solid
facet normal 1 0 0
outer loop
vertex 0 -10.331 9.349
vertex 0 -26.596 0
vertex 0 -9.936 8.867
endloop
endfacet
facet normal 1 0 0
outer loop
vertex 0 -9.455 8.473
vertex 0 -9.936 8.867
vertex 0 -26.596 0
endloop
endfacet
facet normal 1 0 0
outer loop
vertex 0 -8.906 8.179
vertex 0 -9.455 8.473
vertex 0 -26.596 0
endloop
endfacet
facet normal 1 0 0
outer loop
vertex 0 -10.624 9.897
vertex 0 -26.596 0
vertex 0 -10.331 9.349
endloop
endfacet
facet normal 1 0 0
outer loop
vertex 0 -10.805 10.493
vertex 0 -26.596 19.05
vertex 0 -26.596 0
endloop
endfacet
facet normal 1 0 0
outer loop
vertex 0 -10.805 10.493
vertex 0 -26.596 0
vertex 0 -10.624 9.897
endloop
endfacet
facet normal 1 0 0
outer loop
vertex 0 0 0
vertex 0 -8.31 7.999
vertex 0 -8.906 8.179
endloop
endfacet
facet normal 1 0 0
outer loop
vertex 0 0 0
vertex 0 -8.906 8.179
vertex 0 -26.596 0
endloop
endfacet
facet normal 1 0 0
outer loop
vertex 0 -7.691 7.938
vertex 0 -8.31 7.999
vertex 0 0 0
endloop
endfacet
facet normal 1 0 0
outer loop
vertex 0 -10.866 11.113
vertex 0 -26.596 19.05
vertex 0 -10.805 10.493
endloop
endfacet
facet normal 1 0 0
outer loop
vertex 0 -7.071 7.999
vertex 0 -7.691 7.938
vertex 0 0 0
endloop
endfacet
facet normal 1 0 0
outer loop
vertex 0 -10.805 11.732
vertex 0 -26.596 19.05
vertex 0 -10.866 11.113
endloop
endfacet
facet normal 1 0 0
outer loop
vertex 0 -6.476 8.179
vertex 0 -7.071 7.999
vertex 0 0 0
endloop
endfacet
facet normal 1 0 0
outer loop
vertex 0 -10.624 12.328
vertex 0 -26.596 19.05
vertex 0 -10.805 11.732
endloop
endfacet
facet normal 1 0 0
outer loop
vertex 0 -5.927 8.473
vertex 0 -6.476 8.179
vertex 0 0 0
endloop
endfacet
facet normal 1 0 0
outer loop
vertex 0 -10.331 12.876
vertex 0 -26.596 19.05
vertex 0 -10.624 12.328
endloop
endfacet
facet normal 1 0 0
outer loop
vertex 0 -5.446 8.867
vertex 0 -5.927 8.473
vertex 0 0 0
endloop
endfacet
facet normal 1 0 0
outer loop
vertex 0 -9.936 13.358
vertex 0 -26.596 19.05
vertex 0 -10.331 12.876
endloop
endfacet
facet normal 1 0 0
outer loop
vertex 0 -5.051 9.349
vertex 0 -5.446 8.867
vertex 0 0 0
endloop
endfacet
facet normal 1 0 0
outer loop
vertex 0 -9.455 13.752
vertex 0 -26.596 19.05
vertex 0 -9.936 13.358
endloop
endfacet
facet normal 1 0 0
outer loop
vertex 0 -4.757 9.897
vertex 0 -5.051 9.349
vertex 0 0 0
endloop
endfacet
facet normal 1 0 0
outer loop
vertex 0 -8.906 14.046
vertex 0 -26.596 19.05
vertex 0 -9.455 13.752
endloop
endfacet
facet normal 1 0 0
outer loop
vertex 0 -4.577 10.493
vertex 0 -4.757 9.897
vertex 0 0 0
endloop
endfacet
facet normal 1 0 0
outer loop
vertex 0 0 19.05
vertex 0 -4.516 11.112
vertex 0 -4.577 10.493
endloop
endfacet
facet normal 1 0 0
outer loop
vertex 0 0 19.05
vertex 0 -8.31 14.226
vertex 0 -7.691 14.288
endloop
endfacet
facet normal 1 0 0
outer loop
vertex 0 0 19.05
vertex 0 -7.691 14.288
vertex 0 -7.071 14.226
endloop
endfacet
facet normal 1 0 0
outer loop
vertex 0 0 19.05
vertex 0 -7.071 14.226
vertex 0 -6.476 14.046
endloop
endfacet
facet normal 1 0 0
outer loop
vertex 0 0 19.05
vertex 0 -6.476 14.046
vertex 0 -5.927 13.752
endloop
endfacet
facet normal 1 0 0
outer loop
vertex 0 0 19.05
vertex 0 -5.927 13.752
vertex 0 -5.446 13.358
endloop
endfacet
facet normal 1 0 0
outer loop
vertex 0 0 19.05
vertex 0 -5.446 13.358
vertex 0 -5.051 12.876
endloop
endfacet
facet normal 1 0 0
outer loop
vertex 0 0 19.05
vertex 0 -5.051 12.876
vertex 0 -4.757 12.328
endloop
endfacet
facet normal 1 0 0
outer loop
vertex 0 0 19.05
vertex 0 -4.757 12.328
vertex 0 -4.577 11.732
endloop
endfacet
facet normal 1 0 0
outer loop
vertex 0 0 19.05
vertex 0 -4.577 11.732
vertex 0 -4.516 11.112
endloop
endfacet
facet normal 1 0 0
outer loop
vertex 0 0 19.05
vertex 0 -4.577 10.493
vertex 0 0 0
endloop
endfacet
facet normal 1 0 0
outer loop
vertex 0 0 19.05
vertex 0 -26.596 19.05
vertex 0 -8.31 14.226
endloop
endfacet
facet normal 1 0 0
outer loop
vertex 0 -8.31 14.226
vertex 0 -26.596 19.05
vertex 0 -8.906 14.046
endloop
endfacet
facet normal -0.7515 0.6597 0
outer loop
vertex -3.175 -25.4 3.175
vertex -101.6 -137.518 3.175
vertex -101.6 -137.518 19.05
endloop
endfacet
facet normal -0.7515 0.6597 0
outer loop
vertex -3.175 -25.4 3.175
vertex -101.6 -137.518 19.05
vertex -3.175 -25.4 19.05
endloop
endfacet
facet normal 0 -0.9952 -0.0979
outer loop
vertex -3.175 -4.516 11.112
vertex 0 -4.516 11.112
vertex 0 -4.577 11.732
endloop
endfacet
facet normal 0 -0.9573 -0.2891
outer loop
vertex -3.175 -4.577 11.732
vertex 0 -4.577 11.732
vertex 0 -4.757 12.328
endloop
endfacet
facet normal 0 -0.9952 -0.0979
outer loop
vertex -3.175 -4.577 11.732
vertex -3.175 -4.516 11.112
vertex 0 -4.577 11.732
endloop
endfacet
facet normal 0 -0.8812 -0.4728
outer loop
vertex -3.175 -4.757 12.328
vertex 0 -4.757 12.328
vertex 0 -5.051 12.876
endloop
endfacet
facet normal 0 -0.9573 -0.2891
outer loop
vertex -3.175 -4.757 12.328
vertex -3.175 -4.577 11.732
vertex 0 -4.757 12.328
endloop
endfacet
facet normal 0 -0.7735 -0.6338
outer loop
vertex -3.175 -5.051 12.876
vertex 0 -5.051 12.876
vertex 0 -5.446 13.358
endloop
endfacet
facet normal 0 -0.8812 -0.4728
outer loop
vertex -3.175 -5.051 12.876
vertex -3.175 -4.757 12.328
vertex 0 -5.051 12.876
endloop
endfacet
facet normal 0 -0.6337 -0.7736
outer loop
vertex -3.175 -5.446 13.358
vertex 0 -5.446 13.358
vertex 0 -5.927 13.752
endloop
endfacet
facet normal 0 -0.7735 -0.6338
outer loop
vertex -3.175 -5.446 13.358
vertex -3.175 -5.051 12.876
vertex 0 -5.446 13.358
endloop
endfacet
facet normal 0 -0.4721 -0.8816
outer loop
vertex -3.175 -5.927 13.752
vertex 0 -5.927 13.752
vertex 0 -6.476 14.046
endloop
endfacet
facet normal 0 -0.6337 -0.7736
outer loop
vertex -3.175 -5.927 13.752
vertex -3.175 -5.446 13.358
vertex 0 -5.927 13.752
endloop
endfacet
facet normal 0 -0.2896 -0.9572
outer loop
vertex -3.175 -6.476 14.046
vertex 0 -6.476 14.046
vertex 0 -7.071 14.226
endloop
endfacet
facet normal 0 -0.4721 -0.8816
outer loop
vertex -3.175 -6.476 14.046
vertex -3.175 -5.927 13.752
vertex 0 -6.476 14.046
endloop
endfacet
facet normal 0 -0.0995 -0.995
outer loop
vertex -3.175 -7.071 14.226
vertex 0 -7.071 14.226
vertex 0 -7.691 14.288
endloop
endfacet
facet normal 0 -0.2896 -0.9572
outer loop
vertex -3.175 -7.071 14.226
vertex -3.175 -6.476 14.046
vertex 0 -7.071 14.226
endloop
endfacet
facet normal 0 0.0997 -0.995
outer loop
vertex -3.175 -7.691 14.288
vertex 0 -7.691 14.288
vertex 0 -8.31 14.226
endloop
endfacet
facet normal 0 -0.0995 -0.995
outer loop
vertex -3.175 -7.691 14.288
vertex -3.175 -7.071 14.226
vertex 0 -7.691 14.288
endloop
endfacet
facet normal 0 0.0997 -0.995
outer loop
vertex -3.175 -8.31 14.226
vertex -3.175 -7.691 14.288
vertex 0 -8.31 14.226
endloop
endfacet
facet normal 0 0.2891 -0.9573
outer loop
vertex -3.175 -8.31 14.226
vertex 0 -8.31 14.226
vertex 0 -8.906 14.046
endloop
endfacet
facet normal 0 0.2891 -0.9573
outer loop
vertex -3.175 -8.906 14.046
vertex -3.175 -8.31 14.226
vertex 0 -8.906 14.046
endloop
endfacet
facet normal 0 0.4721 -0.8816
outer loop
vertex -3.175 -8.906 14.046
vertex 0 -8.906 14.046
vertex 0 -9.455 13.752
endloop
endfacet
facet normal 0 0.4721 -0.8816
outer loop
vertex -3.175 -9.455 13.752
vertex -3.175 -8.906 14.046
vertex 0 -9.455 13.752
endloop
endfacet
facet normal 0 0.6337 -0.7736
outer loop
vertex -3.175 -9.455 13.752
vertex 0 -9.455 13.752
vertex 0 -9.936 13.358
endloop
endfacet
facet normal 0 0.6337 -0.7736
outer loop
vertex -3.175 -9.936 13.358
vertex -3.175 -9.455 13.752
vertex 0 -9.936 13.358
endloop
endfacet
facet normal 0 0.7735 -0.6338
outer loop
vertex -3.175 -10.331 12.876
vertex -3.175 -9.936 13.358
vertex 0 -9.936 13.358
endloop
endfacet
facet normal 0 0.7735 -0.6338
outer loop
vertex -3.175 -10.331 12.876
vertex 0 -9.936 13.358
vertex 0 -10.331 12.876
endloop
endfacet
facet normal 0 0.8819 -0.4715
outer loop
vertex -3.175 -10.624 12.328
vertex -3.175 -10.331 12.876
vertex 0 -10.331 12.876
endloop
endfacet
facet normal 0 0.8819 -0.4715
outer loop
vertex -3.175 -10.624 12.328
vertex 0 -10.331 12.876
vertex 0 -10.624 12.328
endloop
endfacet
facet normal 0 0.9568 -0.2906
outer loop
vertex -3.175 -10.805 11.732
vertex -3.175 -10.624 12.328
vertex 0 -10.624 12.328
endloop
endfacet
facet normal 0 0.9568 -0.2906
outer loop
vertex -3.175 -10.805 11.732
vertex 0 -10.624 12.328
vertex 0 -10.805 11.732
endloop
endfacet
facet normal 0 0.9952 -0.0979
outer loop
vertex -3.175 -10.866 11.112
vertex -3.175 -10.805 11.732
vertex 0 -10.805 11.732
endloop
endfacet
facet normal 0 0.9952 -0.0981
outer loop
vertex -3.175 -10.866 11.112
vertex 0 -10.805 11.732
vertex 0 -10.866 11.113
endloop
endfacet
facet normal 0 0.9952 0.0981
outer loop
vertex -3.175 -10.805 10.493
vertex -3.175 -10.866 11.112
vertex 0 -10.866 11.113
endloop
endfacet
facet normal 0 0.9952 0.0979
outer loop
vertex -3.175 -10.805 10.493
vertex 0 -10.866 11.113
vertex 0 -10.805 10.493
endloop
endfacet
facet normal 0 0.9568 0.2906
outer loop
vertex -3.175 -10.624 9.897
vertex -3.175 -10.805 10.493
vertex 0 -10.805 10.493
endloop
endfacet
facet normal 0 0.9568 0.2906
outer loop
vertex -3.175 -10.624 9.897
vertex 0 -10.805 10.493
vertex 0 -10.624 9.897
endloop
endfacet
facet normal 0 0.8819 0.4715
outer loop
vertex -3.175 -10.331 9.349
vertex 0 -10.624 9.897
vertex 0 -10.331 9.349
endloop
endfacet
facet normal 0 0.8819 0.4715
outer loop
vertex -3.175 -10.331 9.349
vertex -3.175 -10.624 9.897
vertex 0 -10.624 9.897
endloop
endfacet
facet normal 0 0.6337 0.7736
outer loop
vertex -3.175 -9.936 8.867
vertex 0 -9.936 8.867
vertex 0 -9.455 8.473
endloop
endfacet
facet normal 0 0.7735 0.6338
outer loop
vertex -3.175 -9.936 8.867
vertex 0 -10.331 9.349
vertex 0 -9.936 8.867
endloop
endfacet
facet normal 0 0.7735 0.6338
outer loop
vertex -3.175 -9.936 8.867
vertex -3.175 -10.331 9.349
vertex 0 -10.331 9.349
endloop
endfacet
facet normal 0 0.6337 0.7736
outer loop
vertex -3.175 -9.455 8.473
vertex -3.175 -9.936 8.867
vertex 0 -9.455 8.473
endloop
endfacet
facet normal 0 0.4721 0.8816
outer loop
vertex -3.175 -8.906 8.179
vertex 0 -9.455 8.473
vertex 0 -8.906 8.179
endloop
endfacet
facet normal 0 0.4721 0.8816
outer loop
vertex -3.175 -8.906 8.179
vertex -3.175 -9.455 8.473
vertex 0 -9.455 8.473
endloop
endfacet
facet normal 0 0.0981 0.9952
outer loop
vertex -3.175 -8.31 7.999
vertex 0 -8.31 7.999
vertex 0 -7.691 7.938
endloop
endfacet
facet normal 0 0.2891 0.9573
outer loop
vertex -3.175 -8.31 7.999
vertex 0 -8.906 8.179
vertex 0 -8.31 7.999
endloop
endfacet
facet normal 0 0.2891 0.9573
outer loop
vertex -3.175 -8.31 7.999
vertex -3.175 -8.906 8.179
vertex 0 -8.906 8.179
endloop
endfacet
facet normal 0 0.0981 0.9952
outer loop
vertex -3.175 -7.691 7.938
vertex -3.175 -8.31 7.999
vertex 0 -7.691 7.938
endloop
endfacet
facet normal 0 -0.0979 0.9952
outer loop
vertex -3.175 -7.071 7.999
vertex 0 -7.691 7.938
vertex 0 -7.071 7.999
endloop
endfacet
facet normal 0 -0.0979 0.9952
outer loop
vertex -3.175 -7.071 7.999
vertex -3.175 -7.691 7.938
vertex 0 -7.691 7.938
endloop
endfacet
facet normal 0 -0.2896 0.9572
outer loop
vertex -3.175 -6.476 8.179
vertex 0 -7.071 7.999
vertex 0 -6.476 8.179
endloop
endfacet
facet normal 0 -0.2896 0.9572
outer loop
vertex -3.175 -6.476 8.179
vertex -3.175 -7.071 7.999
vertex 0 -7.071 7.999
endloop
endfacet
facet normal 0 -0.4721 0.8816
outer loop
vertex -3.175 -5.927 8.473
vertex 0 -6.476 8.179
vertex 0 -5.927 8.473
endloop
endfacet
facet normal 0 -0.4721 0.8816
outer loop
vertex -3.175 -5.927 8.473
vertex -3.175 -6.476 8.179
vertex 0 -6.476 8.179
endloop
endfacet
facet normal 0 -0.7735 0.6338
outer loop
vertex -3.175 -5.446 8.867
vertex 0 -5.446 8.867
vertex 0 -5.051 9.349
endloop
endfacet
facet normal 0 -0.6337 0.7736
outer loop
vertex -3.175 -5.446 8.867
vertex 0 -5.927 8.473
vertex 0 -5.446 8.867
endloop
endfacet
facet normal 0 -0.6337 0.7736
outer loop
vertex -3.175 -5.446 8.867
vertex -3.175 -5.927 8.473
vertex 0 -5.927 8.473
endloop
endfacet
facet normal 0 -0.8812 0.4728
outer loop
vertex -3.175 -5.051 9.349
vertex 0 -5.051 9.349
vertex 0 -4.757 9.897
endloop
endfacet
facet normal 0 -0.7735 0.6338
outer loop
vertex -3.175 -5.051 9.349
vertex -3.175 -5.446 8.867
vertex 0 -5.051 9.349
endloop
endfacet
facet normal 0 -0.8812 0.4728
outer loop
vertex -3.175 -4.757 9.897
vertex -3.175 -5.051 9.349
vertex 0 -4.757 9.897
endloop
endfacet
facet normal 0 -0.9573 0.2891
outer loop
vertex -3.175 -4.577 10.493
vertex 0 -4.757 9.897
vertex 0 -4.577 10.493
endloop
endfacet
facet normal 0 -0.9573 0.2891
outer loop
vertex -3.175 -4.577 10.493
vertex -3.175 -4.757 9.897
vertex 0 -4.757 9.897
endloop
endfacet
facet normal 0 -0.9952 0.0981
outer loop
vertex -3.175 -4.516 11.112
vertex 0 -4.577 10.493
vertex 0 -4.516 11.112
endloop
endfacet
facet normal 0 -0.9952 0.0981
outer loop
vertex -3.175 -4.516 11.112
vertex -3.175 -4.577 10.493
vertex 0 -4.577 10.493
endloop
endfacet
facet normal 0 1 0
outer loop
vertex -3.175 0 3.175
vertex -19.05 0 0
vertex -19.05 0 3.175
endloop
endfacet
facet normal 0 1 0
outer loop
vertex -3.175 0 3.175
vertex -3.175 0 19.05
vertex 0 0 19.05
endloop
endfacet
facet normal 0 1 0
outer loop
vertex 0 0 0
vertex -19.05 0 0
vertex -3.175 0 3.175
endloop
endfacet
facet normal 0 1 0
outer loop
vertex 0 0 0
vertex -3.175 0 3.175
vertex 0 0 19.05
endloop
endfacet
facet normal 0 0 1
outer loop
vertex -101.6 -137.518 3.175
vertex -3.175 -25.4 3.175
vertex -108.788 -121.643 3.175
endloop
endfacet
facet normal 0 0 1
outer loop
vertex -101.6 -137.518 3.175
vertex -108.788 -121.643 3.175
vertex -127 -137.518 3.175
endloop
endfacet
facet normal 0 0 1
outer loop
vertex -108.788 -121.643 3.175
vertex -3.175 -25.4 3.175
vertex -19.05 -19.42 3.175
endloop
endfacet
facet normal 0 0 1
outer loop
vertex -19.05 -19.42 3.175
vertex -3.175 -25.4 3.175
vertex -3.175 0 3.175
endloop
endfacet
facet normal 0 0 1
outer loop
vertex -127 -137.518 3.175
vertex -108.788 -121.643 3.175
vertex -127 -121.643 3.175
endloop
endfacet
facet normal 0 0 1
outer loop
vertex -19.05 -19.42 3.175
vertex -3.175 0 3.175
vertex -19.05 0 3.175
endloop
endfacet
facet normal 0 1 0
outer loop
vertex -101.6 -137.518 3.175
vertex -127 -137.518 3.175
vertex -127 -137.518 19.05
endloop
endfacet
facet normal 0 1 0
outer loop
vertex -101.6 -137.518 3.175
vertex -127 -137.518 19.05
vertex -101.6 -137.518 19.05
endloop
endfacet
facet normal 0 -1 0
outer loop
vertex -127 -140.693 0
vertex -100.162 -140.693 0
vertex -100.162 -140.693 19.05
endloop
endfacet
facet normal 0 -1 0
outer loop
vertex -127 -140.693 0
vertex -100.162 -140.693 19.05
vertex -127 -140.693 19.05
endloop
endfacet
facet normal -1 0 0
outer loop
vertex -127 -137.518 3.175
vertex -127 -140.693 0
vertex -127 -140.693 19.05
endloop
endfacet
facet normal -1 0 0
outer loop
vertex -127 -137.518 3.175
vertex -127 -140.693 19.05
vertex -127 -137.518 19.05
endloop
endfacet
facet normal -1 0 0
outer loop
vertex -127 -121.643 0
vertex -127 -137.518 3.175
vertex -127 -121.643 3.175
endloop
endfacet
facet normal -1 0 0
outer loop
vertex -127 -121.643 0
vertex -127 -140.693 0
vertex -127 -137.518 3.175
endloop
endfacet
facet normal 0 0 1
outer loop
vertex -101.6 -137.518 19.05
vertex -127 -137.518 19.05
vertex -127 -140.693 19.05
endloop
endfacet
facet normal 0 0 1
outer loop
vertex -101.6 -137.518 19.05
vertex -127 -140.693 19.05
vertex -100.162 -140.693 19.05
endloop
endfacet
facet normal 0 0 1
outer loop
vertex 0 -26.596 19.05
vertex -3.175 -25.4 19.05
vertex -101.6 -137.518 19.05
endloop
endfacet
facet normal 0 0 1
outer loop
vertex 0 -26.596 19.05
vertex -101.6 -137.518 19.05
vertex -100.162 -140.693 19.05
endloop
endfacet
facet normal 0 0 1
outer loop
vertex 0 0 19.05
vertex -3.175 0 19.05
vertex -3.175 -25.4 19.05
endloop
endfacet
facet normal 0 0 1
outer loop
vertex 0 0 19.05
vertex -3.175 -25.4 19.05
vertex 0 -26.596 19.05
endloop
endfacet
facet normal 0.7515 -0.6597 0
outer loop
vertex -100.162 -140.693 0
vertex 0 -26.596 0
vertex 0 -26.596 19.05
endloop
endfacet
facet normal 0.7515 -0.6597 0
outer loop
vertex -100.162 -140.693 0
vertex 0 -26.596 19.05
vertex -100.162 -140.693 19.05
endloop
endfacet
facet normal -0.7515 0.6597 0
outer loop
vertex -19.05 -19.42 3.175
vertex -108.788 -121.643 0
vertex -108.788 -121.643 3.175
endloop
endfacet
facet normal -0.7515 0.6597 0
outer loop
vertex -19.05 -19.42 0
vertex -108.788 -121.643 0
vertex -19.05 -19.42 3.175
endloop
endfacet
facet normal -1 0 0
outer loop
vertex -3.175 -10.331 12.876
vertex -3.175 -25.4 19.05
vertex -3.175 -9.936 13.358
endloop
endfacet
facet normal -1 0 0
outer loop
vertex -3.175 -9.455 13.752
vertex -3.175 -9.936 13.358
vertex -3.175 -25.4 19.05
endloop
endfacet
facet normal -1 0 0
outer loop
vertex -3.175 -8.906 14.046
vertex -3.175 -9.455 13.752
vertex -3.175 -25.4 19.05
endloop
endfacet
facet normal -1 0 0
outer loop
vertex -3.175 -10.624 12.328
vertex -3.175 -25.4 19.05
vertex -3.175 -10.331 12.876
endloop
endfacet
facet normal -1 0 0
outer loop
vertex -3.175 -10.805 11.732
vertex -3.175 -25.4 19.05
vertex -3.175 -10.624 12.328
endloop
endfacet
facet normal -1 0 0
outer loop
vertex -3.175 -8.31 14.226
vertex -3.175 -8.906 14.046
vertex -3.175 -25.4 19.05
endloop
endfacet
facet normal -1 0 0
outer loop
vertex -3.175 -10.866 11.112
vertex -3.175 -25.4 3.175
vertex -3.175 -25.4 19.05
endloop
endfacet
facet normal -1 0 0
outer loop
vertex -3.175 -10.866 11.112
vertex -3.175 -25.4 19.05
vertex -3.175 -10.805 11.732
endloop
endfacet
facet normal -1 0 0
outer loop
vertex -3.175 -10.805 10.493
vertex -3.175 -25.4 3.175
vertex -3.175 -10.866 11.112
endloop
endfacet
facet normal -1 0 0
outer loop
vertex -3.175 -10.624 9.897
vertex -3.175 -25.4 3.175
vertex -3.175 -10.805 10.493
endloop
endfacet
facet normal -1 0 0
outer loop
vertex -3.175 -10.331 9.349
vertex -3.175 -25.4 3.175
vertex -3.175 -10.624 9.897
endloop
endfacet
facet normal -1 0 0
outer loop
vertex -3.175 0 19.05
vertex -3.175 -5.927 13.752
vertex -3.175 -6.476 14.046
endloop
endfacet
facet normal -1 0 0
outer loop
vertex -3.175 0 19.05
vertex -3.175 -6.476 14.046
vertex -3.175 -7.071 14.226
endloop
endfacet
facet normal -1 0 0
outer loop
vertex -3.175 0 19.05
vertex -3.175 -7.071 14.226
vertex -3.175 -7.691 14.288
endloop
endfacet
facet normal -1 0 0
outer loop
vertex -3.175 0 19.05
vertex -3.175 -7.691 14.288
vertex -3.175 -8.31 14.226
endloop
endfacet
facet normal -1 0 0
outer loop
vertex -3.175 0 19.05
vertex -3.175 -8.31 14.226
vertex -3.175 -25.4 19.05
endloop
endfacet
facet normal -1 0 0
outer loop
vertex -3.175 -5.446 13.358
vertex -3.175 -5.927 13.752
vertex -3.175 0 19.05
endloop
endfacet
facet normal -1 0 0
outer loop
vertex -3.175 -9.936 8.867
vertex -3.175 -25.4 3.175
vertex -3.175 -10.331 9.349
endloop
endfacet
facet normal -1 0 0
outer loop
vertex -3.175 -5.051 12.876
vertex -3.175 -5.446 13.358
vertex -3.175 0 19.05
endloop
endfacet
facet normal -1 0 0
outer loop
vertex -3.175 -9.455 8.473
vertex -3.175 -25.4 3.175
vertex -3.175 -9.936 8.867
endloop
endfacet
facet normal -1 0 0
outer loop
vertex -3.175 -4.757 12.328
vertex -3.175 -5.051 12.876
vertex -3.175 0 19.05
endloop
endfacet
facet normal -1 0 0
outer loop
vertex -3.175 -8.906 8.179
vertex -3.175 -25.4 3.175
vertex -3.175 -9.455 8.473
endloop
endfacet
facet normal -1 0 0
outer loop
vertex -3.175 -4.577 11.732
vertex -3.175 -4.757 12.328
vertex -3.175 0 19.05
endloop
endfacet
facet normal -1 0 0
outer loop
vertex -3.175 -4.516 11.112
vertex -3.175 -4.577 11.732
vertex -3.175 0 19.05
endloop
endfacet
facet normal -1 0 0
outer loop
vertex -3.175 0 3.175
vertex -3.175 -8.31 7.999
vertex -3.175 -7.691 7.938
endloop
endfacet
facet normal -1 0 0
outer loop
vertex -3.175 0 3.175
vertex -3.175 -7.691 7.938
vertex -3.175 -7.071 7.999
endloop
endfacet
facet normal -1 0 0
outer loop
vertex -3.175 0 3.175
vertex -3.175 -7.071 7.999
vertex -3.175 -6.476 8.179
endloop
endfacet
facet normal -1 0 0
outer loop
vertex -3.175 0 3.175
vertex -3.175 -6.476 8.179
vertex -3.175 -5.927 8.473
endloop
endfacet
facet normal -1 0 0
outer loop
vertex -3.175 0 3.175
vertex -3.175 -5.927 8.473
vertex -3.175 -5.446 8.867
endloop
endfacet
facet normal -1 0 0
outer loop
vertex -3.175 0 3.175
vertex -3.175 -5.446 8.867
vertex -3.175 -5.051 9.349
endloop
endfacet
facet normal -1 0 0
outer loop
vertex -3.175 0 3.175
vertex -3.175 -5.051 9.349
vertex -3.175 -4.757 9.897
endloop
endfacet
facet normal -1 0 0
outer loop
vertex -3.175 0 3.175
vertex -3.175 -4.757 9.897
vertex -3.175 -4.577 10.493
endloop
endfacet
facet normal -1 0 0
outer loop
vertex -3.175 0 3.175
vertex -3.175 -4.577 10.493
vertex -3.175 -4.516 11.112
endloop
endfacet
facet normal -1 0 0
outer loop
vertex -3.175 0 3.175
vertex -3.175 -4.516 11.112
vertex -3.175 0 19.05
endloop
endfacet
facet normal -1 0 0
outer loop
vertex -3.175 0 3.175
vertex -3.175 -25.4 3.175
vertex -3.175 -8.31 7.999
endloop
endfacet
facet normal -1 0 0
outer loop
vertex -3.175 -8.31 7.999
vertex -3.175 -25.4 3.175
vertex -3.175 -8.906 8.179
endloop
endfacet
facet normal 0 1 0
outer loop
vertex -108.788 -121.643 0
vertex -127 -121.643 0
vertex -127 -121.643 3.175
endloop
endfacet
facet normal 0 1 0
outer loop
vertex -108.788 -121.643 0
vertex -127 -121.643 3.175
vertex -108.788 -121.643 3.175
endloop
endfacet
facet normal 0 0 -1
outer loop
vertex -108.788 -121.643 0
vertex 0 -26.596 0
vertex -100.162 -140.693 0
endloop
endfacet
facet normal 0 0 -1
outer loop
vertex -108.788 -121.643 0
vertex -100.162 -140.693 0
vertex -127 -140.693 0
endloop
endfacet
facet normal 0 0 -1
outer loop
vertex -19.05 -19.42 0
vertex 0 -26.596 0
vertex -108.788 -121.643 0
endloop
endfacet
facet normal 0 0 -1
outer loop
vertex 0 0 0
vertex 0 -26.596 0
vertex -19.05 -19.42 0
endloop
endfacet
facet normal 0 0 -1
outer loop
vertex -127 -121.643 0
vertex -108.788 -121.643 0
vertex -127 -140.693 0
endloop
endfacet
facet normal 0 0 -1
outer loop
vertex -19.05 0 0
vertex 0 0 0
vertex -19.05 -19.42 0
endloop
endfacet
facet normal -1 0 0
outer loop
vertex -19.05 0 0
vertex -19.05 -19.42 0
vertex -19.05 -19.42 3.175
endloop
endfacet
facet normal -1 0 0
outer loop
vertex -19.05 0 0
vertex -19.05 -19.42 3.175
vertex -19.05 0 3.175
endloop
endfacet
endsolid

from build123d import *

# Parameters (mm, degrees)
BOSS_EXTRUDE1_DEPTH = 19.05
BOSS_EXTRUDE2_DEPTH = 3.175
SKETCH3_R           = 3.175
CUT_EXTRUDE1_DEPTH  = 189.387669682
SKETCH4_W           = 151.529186582
SKETCH4_H           = 154.937341475
CUT_EXTRUDE2_DEPTH  = 146.05


with BuildPart() as part:
    # Sketch1 → Boss-Extrude1 (new body)
    with BuildSketch(Plane.XY):
        Polygon((0, 0), (0, -26.595904174), (100.162396017, -140.692505), (127, -140.692505), (127, -137.517505), (101.6, -137.517505), (3.175, -25.4), (3.175, 0), align=None)
    boss_extrude1 = extrude(amount=BOSS_EXTRUDE1_DEPTH)

    # Sketch2 → Boss-Extrude2 (add)
    with BuildSketch(Plane(origin=(0, 0, 0), x_dir=(-1, 0, 0), z_dir=(0, 0, -1))):
        Polygon((-19.05, 0), (-3.175, 0), (-3.175, -25.4), (-101.6, -137.517505), (-127, -137.517505), (-127, -121.642505), (-108.788019913, -121.642505), (-19.05, -19.42047913), align=None)
    boss_extrude2 = extrude(amount=-BOSS_EXTRUDE2_DEPTH)

    # Sketch3 → Cut-Extrude1 (cut, through all)
    with BuildSketch(Plane(origin=(3.175, 0, 0), x_dir=(0, 0, -1), z_dir=(1, 0, 0))):
        with Locations(Location((-11.1125, -7.690689216, 0), (0, 0, 90))):
            Circle(SKETCH3_R)
    cut_extrude1 = extrude(amount=-CUT_EXTRUDE1_DEPTH, mode=Mode.SUBTRACT)

    # Mirror1: Boss-Extrude1, Boss-Extrude2, Cut-Extrude1 across plane
    add(boss_extrude1.mirror(Plane(origin=(0, 0, 19.05), x_dir=(0, 0, 1), z_dir=(1, 0, 0))))
    add(boss_extrude2.mirror(Plane(origin=(0, 0, 19.05), x_dir=(0, 0, 1), z_dir=(1, 0, 0))))
    add(cut_extrude1.mirror(Plane(origin=(0, 0, 19.05), x_dir=(0, 0, 1), z_dir=(1, 0, 0))), mode=Mode.SUBTRACT)

    # Sketch4 → Cut-Extrude2 (cut)
    with BuildSketch(Plane.XY.offset(19.05)):
        with Locations((75.764593291, -77.468670738)):
            Rectangle(SKETCH4_W, SKETCH4_H)
    extrude(amount=-CUT_EXTRUDE2_DEPTH, mode=Mode.SUBTRACT)


solid = part.part
